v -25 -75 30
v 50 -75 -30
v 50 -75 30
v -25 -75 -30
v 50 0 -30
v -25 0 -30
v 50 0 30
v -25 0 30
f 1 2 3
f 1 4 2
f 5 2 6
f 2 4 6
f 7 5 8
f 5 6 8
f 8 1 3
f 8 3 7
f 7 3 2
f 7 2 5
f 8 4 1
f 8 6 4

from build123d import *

# Parameters (mm, degrees)
F0_W      = 50
F0_H      = 60
F1_DEPTH  = 25
F1_FACE_W = 50
F1_FACE_H = 60
F2_DEPTH  = 50
F2_FACE_W = 75
F2_FACE_H = 60
F3_DEPTH  = 25


with BuildPart() as f1:
    # F0 (on Front) → F1 (new body)
    with BuildSketch(Plane.XZ):
        Rectangle(F0_W, F0_H)
    extrude(amount=F1_DEPTH)

    # F1_face (on face) → F2 (join)
    with BuildSketch(Plane.XZ.offset(25)):
        Rectangle(F1_FACE_W, F1_FACE_H)
    extrude(amount=F2_DEPTH)

    # F2_face (on face) → F3 (join)
    with BuildSketch(Plane(origin=(25, -37.5, 0), x_dir=(0, 1, 0), z_dir=(1, 0, 0))):
        Rectangle(F2_FACE_W, F2_FACE_H)
    extrude(amount=F3_DEPTH)


solid = f1.part
